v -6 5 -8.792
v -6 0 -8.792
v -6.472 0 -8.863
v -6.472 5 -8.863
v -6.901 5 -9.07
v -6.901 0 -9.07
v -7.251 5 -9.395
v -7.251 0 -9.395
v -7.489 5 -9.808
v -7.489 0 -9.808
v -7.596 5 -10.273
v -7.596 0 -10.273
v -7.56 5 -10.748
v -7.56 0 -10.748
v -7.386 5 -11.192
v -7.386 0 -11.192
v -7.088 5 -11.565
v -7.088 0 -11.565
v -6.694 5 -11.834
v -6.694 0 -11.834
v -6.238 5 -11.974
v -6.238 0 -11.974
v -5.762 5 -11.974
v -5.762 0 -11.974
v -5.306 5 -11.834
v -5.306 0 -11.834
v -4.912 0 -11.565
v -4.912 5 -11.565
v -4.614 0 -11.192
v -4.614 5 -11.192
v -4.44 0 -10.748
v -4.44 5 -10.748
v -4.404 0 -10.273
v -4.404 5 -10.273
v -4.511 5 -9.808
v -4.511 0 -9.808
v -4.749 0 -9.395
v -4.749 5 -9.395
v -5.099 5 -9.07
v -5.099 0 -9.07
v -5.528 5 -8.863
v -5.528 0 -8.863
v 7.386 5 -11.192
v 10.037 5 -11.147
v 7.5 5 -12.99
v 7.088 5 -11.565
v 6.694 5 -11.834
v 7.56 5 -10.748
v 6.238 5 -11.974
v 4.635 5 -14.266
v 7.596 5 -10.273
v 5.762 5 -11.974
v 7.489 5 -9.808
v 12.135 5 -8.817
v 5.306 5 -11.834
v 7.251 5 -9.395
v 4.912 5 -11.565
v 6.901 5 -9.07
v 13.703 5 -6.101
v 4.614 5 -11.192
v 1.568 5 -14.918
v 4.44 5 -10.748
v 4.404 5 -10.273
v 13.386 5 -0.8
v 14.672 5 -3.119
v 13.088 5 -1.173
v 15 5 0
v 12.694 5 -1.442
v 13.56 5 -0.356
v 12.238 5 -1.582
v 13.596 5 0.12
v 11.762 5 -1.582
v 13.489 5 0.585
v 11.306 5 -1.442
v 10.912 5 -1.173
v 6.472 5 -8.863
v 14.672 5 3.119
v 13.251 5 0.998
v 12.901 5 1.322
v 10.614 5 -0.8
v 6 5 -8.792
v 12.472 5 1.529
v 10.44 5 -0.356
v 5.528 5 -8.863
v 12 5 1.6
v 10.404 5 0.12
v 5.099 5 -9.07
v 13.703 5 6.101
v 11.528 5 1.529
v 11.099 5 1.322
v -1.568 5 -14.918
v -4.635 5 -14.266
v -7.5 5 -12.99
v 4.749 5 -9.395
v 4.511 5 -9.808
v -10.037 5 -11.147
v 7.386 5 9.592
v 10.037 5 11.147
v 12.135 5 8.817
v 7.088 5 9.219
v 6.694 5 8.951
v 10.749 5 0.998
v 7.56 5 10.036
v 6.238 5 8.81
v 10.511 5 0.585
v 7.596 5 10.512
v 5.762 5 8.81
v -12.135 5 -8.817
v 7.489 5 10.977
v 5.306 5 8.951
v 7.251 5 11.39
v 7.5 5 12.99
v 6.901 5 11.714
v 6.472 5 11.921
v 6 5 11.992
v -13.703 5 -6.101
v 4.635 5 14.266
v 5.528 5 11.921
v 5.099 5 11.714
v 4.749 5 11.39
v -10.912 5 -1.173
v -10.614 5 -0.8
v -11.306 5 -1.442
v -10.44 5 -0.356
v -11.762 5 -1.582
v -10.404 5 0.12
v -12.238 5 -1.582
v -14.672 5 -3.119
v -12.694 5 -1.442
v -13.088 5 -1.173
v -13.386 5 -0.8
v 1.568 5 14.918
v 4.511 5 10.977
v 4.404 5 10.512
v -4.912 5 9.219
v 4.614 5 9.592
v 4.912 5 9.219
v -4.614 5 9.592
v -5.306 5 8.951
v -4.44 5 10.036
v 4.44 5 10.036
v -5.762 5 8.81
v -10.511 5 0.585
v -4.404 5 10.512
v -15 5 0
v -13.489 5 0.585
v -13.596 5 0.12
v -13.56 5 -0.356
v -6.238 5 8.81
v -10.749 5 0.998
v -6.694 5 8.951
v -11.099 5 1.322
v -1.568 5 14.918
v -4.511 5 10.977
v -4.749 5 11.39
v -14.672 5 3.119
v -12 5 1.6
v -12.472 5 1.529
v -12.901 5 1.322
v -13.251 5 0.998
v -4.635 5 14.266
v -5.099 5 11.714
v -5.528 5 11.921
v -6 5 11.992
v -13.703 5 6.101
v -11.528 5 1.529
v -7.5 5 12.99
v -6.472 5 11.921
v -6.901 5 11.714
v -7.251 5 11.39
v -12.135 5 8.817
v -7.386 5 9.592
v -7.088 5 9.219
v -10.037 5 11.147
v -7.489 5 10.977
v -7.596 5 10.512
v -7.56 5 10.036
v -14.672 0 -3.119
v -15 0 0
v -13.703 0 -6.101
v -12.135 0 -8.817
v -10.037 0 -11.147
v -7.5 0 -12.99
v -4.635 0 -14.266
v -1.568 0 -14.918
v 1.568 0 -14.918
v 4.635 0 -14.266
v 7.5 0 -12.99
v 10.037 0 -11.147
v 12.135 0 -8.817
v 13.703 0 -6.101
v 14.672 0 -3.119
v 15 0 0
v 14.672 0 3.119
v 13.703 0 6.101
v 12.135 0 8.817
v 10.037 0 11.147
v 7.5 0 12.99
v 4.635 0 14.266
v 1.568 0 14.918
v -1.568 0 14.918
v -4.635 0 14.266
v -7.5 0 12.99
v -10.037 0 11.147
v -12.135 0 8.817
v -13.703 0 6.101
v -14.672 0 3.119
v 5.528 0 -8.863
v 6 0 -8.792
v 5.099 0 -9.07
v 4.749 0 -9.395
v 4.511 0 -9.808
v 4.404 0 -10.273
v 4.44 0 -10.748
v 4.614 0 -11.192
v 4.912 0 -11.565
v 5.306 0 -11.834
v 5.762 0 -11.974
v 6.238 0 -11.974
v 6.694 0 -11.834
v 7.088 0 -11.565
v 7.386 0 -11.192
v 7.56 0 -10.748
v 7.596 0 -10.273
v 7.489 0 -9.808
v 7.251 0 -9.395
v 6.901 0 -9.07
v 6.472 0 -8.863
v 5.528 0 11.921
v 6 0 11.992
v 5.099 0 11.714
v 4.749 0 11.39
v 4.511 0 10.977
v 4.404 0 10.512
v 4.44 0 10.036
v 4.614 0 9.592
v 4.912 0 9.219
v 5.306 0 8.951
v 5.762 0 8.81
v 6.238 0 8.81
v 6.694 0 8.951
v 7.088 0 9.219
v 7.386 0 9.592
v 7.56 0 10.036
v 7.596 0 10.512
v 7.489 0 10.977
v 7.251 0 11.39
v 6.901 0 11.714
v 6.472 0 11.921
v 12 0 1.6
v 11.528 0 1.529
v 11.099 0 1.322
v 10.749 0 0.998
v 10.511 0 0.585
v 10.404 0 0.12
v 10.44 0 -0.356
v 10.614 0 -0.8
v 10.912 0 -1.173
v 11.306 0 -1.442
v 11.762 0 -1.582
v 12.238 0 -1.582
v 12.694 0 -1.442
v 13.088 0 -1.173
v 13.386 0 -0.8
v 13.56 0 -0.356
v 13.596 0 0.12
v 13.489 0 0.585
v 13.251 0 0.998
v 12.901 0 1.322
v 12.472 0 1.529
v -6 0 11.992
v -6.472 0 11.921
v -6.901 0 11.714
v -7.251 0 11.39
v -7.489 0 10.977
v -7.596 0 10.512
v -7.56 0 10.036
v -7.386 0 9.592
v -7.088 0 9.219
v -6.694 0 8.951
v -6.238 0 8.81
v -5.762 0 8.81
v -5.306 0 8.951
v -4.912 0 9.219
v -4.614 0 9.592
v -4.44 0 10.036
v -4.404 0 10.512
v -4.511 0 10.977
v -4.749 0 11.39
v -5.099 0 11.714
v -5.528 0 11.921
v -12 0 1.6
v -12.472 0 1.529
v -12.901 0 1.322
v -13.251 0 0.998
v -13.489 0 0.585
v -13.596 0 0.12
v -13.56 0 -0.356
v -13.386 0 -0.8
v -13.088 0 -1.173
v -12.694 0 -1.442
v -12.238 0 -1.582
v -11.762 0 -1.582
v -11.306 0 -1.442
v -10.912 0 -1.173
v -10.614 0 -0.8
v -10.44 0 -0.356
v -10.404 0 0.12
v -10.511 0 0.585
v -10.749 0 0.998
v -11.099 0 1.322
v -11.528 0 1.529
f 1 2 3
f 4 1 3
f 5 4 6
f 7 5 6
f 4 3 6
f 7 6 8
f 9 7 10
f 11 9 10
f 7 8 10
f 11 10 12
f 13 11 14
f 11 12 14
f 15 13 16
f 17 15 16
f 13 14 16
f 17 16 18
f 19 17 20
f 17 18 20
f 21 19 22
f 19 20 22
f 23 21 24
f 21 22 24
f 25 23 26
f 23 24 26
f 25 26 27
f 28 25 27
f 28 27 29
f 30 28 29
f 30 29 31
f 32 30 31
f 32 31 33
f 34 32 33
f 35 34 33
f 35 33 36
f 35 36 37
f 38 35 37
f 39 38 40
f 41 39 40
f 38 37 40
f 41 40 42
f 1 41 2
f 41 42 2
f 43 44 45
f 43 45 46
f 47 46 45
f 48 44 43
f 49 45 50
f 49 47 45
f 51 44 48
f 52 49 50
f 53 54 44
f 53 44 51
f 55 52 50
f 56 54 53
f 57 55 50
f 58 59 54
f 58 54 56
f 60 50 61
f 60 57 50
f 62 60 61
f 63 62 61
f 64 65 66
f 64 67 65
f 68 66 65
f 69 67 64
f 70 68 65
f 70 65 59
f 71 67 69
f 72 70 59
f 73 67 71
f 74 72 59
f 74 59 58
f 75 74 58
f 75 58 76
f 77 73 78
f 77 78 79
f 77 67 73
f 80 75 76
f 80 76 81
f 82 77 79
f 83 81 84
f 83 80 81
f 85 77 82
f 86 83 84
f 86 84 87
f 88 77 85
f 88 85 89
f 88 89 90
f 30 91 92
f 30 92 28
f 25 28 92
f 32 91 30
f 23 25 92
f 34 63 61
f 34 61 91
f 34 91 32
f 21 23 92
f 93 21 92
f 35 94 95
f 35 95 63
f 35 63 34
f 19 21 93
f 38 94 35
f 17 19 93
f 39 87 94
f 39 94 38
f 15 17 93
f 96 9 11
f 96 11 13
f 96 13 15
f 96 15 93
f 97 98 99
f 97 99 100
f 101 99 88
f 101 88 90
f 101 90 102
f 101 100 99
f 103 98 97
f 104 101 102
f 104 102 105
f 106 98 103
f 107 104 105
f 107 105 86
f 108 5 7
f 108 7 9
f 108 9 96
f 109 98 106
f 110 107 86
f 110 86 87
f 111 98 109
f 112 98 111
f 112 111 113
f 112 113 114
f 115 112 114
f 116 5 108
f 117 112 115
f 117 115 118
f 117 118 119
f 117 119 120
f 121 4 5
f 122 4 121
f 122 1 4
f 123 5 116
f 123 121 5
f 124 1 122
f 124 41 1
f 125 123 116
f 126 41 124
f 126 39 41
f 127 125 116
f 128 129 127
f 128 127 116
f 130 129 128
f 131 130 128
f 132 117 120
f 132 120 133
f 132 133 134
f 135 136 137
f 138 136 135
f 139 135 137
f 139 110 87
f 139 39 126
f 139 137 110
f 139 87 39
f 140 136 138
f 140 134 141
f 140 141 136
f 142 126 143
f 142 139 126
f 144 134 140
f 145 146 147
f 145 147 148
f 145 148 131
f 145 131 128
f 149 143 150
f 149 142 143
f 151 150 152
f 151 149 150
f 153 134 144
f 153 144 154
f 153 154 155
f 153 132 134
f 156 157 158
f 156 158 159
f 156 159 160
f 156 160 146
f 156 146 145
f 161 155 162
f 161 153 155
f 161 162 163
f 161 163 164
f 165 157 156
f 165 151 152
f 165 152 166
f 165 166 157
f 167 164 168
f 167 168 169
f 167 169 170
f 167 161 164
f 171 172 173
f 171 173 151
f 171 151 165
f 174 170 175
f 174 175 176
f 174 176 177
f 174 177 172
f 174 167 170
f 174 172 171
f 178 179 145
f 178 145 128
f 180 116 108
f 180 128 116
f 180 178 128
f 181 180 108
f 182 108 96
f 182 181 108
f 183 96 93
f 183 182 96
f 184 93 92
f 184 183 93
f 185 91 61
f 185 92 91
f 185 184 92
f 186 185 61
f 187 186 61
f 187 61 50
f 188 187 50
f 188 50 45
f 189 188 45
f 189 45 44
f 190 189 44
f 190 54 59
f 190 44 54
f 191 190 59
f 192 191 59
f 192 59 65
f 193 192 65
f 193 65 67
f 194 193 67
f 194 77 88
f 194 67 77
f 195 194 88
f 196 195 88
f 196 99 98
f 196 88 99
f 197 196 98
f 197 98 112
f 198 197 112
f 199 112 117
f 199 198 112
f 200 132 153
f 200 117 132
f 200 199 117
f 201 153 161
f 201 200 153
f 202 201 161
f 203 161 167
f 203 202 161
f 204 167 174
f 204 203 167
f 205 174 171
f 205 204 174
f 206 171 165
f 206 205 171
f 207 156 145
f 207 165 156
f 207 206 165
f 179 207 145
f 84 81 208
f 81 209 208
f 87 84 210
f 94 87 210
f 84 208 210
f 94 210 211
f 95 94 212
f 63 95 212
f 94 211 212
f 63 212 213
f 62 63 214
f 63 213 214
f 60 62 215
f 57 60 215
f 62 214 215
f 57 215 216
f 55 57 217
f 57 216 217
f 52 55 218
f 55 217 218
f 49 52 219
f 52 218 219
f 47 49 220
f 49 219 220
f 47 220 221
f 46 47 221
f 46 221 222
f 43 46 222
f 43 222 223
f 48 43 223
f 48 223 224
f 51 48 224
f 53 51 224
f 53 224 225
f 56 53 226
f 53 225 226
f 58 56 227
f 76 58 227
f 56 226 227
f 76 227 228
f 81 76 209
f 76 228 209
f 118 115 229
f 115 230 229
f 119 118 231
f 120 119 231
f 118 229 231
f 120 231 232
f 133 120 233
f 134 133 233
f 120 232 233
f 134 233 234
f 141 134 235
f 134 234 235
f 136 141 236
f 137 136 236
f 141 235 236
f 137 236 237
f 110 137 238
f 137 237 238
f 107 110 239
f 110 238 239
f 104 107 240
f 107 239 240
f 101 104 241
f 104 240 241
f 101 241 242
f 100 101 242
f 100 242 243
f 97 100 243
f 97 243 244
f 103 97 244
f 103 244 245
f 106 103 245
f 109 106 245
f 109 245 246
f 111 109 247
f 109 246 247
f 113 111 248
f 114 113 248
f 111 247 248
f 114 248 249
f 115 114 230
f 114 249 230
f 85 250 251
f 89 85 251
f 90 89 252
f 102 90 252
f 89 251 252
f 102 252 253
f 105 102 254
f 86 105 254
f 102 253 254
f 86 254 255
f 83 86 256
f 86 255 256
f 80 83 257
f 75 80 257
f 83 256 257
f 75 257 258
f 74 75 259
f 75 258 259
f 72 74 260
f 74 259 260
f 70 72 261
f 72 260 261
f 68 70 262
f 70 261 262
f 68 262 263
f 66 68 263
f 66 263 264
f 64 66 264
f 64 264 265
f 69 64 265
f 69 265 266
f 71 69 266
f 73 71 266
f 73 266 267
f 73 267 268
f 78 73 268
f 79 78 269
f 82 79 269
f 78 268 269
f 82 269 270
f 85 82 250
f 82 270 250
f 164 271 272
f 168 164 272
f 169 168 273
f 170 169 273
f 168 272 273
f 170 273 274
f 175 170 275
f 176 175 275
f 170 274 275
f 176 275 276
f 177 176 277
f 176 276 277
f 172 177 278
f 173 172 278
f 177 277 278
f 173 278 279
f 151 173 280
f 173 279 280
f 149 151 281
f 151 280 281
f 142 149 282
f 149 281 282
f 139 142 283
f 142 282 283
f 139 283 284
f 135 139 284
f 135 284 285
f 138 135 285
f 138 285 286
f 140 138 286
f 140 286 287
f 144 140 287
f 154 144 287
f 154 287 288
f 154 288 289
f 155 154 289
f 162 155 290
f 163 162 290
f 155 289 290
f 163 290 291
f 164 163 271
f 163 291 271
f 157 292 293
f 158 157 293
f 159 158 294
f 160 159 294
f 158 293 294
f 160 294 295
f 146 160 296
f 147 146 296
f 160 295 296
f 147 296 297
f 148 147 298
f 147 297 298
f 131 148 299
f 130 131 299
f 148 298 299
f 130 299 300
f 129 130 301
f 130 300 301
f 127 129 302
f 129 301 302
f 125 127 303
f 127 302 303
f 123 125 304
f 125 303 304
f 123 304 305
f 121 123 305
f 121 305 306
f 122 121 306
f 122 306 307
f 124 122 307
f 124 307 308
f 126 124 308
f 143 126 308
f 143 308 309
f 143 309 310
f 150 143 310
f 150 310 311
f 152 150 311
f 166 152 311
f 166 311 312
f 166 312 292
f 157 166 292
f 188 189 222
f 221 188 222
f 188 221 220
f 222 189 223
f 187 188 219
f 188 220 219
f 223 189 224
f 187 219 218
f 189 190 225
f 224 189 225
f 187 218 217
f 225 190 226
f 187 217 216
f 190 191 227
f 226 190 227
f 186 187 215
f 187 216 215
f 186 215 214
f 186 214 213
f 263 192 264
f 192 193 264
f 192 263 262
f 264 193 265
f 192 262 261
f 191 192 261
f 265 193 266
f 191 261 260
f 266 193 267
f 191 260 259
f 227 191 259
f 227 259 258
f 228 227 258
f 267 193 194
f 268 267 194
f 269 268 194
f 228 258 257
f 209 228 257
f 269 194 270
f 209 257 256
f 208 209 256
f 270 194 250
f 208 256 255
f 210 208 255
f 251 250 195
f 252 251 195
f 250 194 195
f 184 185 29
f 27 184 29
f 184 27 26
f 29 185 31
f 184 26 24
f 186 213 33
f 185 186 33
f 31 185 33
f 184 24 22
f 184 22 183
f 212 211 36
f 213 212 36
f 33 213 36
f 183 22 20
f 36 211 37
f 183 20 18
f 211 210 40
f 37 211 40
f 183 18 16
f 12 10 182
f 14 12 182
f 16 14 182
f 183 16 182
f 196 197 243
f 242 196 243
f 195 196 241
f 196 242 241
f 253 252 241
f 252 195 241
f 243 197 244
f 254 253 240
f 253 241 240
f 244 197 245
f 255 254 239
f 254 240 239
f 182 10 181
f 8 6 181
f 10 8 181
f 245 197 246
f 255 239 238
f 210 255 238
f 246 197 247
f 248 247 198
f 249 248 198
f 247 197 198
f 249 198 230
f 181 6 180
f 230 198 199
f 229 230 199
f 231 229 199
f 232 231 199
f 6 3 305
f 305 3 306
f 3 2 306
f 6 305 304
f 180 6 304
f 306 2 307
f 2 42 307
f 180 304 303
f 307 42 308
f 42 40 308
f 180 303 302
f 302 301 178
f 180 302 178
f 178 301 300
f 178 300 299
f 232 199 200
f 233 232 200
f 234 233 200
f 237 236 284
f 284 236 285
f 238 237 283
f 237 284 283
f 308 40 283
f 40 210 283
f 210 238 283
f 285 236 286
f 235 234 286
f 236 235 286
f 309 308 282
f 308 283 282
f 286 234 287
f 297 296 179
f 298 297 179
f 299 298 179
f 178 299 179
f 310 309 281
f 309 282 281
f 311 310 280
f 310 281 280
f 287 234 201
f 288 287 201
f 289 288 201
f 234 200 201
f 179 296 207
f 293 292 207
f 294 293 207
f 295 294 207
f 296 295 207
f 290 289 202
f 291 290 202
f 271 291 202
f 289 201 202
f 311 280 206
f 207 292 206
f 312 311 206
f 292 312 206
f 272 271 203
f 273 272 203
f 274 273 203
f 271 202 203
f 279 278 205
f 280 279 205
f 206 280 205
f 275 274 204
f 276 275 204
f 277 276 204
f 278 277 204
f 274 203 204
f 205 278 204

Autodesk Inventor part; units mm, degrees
ref_plane "YZ Plane" through (0, 0, 0) normal (1, 0, 0) x (0, 1, 0)
ref_plane "XZ Plane" through (0, 0, 0) normal (0, 1, 0) x (-1, 0, 0)
ref_plane "XY Plane" through (0, 0, 0) normal (0, 0, 1) x (1, 0, 0)
sketch "スケッチ1" plane through (0, 0, 0) normal (0, 1, 0) x (-1, 0, 0)
  circle A0 centre (0, 0) radius 15
  dimension "d0" = 30
extrude "押し出し1" add sketch "スケッチ1" along normal blind 5
sketch "スケッチ2" plane through (0, 5, 0) normal (0, 1, 0) x (1, 0, 0)
  circle A0 centre (0, 0) radius 12
  point P0 (-12, 0)
  point P1 (-6, -10.3923)
  point P2 (6, -10.3923)
  point P3 (12, 0)
  point P4 (6, 10.3923)
  point P5 (-6, 10.3923)
  dimension "d3" = 24
  dimension "d6" = 360
hole "穴1" at (-12, 5, 0) at (-6, 5, 10.3923) at (6, 5, 10.3923) at (12, 5, 0) at (6, 5, -10.3923) at (-6, 5, -10.3923) direction (0, -1, 0) diameter 3.2 end through all
properties part number "baseplate_forR2" material "アルミニウム 6061"
